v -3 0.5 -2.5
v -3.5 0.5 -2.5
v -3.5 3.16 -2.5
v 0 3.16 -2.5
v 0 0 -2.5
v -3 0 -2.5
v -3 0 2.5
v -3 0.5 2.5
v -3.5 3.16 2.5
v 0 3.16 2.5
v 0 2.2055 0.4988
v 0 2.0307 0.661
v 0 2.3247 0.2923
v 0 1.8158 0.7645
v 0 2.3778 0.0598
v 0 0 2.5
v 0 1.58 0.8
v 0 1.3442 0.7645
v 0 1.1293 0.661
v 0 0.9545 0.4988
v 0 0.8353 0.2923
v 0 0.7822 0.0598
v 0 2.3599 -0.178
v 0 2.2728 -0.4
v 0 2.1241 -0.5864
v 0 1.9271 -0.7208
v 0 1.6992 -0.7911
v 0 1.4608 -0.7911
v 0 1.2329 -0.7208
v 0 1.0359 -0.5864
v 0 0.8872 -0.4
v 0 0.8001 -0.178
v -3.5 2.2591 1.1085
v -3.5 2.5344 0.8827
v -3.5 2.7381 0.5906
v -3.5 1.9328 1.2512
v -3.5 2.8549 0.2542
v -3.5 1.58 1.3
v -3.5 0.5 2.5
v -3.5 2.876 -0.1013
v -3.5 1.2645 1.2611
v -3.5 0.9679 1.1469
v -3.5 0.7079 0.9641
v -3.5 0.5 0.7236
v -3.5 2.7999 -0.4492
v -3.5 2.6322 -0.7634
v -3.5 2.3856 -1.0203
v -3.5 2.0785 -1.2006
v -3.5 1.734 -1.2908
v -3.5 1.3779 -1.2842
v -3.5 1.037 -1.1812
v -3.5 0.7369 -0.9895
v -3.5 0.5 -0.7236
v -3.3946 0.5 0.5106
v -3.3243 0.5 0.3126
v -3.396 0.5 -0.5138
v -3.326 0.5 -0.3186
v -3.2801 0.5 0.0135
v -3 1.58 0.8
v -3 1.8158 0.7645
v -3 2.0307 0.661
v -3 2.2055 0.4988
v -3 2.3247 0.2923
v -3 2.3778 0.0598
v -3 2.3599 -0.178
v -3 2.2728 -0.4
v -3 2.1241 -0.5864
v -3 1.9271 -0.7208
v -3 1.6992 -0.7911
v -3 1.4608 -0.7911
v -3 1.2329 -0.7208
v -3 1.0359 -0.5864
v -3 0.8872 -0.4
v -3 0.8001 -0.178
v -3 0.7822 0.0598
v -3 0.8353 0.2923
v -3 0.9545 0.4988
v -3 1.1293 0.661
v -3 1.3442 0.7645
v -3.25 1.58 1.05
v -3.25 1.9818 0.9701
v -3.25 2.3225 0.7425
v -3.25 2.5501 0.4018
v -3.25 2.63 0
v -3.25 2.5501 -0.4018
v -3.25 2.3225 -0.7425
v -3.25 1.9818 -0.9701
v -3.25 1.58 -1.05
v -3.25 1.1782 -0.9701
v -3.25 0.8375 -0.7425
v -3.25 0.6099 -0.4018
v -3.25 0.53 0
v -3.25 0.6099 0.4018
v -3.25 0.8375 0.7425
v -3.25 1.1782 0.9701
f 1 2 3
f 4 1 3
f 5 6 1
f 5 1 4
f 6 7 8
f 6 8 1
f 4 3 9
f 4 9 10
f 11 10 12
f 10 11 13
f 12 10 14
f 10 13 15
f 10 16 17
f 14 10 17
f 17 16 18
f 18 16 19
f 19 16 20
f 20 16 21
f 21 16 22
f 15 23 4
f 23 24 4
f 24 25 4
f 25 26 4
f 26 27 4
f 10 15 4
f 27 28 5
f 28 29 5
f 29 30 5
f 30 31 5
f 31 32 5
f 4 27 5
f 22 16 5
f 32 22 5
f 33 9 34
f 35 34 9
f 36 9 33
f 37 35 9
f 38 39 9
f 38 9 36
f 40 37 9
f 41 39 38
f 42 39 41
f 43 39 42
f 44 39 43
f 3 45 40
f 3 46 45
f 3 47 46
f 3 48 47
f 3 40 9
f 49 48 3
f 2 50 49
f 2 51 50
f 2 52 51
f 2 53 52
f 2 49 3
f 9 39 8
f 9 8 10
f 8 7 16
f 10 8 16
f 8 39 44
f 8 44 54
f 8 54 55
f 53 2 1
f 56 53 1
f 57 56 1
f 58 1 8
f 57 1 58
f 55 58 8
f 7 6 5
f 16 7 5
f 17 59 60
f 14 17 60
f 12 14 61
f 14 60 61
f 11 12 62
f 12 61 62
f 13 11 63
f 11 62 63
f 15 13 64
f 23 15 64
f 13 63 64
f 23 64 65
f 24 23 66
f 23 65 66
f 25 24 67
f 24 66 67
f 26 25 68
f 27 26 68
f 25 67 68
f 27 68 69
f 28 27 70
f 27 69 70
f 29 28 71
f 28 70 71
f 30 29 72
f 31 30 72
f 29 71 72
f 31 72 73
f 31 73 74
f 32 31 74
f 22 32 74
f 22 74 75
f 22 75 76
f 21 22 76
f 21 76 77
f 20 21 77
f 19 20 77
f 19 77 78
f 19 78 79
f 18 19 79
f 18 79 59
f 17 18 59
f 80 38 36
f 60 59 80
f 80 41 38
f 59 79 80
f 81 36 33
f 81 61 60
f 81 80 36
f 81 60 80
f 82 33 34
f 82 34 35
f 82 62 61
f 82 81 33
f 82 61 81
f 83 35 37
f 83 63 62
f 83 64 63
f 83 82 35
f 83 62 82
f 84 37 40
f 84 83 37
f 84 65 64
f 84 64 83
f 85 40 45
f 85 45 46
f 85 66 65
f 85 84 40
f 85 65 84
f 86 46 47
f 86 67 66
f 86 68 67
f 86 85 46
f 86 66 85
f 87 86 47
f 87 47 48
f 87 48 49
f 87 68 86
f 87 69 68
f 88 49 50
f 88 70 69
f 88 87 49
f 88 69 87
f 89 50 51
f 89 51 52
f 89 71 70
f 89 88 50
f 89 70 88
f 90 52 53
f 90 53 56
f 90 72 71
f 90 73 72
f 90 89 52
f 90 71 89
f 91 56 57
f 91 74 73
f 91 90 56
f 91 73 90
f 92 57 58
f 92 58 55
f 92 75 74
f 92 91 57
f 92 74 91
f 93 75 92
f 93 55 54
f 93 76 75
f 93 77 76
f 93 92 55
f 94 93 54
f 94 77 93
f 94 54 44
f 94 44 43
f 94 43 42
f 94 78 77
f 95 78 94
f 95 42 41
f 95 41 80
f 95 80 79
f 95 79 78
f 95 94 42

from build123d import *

# Parameters (mm, degrees)
SKETCH1_W               = 6
SKETCH1_H               = 5
BOSS_EXTRUDE1_DEPTH     = 0.5
SKETCH2_W               = 7
SKETCH2_H               = 5
BOSS_EXTRUDE2_DEPTH     = 2.66
SKETCH3_R               = 0.8
CUT_EXTRUDE1_DEPTH      = 9.076855824
CHAMFER1_SIZE           = 0.5
CUT_EXTRUDE2_DEPTH      = 6.337190272
CUT_EXTRUDE2_DEPTH_BACK = 6.337190272
SKETCH4_W               = 3.5
SKETCH4_H               = 5


with BuildPart() as part:
    # Sketch1 → Boss-Extrude1 (new body)
    with BuildSketch(Plane(origin=(0, 0, 0), x_dir=(1, 0, 0), z_dir=(0, 1, 0))):
        Rectangle(SKETCH1_W, SKETCH1_H)
    extrude(amount=BOSS_EXTRUDE1_DEPTH)

    # Sketch2 → Boss-Extrude2 (add)
    with BuildSketch(Plane(origin=(0, 0.5, 0), x_dir=(1, 0, 0), z_dir=(0, 1, 0))):
        Rectangle(SKETCH2_W, SKETCH2_H)
    extrude(amount=BOSS_EXTRUDE2_DEPTH)

    # Sketch3 → Cut-Extrude1 (cut, through all)
    with BuildSketch(Plane.ZY.offset(3.5)):
        with Locations((0, 1.58)):
            Circle(SKETCH3_R)
    extrude(amount=-CUT_EXTRUDE1_DEPTH, mode=Mode.SUBTRACT)

    # Chamfer1
    # the kernel refuses this chamfer: 0.5 mm, written as the material it takes off along each edge
    with BuildSketch(Plane(origin=(3.5, 1.58, 0), x_dir=(0, 0, 1), z_dir=(0, -1, 0))) as chamfer1_piece_1:
        Polygon((0.8 + CHAMFER1_SIZE, 0), (0.8, CHAMFER1_SIZE), (0.8, 0), align=None)
    revolve(axis=Axis((3.5, 1.58, 0), (-1, 0, 0)), mode=Mode.SUBTRACT)
    with BuildSketch(Plane(origin=(-3.5, 1.58, 0), x_dir=(0, 0, 1), z_dir=(0, -1, 0))) as chamfer1_piece_2:
        Polygon((0.8 + CHAMFER1_SIZE, 0), (0.8, -CHAMFER1_SIZE), (0.8, 0), align=None)
    revolve(axis=Axis((-3.5, 1.58, 0), (-1, 0, 0)), mode=Mode.SUBTRACT)

    # Sketch4 → Cut-Extrude2 (cut, two sides: drawn at the far end of the back side and taken through both)
    with BuildSketch(Plane(origin=(0, 3.16, 0), x_dir=(1, 0, 0), z_dir=(0, 1, 0)).offset(-CUT_EXTRUDE2_DEPTH_BACK)):
        with Locations((1.75, 0)):
            Rectangle(SKETCH4_W, SKETCH4_H)
    extrude(amount=CUT_EXTRUDE2_DEPTH + CUT_EXTRUDE2_DEPTH_BACK, mode=Mode.SUBTRACT)


solid = part.part
